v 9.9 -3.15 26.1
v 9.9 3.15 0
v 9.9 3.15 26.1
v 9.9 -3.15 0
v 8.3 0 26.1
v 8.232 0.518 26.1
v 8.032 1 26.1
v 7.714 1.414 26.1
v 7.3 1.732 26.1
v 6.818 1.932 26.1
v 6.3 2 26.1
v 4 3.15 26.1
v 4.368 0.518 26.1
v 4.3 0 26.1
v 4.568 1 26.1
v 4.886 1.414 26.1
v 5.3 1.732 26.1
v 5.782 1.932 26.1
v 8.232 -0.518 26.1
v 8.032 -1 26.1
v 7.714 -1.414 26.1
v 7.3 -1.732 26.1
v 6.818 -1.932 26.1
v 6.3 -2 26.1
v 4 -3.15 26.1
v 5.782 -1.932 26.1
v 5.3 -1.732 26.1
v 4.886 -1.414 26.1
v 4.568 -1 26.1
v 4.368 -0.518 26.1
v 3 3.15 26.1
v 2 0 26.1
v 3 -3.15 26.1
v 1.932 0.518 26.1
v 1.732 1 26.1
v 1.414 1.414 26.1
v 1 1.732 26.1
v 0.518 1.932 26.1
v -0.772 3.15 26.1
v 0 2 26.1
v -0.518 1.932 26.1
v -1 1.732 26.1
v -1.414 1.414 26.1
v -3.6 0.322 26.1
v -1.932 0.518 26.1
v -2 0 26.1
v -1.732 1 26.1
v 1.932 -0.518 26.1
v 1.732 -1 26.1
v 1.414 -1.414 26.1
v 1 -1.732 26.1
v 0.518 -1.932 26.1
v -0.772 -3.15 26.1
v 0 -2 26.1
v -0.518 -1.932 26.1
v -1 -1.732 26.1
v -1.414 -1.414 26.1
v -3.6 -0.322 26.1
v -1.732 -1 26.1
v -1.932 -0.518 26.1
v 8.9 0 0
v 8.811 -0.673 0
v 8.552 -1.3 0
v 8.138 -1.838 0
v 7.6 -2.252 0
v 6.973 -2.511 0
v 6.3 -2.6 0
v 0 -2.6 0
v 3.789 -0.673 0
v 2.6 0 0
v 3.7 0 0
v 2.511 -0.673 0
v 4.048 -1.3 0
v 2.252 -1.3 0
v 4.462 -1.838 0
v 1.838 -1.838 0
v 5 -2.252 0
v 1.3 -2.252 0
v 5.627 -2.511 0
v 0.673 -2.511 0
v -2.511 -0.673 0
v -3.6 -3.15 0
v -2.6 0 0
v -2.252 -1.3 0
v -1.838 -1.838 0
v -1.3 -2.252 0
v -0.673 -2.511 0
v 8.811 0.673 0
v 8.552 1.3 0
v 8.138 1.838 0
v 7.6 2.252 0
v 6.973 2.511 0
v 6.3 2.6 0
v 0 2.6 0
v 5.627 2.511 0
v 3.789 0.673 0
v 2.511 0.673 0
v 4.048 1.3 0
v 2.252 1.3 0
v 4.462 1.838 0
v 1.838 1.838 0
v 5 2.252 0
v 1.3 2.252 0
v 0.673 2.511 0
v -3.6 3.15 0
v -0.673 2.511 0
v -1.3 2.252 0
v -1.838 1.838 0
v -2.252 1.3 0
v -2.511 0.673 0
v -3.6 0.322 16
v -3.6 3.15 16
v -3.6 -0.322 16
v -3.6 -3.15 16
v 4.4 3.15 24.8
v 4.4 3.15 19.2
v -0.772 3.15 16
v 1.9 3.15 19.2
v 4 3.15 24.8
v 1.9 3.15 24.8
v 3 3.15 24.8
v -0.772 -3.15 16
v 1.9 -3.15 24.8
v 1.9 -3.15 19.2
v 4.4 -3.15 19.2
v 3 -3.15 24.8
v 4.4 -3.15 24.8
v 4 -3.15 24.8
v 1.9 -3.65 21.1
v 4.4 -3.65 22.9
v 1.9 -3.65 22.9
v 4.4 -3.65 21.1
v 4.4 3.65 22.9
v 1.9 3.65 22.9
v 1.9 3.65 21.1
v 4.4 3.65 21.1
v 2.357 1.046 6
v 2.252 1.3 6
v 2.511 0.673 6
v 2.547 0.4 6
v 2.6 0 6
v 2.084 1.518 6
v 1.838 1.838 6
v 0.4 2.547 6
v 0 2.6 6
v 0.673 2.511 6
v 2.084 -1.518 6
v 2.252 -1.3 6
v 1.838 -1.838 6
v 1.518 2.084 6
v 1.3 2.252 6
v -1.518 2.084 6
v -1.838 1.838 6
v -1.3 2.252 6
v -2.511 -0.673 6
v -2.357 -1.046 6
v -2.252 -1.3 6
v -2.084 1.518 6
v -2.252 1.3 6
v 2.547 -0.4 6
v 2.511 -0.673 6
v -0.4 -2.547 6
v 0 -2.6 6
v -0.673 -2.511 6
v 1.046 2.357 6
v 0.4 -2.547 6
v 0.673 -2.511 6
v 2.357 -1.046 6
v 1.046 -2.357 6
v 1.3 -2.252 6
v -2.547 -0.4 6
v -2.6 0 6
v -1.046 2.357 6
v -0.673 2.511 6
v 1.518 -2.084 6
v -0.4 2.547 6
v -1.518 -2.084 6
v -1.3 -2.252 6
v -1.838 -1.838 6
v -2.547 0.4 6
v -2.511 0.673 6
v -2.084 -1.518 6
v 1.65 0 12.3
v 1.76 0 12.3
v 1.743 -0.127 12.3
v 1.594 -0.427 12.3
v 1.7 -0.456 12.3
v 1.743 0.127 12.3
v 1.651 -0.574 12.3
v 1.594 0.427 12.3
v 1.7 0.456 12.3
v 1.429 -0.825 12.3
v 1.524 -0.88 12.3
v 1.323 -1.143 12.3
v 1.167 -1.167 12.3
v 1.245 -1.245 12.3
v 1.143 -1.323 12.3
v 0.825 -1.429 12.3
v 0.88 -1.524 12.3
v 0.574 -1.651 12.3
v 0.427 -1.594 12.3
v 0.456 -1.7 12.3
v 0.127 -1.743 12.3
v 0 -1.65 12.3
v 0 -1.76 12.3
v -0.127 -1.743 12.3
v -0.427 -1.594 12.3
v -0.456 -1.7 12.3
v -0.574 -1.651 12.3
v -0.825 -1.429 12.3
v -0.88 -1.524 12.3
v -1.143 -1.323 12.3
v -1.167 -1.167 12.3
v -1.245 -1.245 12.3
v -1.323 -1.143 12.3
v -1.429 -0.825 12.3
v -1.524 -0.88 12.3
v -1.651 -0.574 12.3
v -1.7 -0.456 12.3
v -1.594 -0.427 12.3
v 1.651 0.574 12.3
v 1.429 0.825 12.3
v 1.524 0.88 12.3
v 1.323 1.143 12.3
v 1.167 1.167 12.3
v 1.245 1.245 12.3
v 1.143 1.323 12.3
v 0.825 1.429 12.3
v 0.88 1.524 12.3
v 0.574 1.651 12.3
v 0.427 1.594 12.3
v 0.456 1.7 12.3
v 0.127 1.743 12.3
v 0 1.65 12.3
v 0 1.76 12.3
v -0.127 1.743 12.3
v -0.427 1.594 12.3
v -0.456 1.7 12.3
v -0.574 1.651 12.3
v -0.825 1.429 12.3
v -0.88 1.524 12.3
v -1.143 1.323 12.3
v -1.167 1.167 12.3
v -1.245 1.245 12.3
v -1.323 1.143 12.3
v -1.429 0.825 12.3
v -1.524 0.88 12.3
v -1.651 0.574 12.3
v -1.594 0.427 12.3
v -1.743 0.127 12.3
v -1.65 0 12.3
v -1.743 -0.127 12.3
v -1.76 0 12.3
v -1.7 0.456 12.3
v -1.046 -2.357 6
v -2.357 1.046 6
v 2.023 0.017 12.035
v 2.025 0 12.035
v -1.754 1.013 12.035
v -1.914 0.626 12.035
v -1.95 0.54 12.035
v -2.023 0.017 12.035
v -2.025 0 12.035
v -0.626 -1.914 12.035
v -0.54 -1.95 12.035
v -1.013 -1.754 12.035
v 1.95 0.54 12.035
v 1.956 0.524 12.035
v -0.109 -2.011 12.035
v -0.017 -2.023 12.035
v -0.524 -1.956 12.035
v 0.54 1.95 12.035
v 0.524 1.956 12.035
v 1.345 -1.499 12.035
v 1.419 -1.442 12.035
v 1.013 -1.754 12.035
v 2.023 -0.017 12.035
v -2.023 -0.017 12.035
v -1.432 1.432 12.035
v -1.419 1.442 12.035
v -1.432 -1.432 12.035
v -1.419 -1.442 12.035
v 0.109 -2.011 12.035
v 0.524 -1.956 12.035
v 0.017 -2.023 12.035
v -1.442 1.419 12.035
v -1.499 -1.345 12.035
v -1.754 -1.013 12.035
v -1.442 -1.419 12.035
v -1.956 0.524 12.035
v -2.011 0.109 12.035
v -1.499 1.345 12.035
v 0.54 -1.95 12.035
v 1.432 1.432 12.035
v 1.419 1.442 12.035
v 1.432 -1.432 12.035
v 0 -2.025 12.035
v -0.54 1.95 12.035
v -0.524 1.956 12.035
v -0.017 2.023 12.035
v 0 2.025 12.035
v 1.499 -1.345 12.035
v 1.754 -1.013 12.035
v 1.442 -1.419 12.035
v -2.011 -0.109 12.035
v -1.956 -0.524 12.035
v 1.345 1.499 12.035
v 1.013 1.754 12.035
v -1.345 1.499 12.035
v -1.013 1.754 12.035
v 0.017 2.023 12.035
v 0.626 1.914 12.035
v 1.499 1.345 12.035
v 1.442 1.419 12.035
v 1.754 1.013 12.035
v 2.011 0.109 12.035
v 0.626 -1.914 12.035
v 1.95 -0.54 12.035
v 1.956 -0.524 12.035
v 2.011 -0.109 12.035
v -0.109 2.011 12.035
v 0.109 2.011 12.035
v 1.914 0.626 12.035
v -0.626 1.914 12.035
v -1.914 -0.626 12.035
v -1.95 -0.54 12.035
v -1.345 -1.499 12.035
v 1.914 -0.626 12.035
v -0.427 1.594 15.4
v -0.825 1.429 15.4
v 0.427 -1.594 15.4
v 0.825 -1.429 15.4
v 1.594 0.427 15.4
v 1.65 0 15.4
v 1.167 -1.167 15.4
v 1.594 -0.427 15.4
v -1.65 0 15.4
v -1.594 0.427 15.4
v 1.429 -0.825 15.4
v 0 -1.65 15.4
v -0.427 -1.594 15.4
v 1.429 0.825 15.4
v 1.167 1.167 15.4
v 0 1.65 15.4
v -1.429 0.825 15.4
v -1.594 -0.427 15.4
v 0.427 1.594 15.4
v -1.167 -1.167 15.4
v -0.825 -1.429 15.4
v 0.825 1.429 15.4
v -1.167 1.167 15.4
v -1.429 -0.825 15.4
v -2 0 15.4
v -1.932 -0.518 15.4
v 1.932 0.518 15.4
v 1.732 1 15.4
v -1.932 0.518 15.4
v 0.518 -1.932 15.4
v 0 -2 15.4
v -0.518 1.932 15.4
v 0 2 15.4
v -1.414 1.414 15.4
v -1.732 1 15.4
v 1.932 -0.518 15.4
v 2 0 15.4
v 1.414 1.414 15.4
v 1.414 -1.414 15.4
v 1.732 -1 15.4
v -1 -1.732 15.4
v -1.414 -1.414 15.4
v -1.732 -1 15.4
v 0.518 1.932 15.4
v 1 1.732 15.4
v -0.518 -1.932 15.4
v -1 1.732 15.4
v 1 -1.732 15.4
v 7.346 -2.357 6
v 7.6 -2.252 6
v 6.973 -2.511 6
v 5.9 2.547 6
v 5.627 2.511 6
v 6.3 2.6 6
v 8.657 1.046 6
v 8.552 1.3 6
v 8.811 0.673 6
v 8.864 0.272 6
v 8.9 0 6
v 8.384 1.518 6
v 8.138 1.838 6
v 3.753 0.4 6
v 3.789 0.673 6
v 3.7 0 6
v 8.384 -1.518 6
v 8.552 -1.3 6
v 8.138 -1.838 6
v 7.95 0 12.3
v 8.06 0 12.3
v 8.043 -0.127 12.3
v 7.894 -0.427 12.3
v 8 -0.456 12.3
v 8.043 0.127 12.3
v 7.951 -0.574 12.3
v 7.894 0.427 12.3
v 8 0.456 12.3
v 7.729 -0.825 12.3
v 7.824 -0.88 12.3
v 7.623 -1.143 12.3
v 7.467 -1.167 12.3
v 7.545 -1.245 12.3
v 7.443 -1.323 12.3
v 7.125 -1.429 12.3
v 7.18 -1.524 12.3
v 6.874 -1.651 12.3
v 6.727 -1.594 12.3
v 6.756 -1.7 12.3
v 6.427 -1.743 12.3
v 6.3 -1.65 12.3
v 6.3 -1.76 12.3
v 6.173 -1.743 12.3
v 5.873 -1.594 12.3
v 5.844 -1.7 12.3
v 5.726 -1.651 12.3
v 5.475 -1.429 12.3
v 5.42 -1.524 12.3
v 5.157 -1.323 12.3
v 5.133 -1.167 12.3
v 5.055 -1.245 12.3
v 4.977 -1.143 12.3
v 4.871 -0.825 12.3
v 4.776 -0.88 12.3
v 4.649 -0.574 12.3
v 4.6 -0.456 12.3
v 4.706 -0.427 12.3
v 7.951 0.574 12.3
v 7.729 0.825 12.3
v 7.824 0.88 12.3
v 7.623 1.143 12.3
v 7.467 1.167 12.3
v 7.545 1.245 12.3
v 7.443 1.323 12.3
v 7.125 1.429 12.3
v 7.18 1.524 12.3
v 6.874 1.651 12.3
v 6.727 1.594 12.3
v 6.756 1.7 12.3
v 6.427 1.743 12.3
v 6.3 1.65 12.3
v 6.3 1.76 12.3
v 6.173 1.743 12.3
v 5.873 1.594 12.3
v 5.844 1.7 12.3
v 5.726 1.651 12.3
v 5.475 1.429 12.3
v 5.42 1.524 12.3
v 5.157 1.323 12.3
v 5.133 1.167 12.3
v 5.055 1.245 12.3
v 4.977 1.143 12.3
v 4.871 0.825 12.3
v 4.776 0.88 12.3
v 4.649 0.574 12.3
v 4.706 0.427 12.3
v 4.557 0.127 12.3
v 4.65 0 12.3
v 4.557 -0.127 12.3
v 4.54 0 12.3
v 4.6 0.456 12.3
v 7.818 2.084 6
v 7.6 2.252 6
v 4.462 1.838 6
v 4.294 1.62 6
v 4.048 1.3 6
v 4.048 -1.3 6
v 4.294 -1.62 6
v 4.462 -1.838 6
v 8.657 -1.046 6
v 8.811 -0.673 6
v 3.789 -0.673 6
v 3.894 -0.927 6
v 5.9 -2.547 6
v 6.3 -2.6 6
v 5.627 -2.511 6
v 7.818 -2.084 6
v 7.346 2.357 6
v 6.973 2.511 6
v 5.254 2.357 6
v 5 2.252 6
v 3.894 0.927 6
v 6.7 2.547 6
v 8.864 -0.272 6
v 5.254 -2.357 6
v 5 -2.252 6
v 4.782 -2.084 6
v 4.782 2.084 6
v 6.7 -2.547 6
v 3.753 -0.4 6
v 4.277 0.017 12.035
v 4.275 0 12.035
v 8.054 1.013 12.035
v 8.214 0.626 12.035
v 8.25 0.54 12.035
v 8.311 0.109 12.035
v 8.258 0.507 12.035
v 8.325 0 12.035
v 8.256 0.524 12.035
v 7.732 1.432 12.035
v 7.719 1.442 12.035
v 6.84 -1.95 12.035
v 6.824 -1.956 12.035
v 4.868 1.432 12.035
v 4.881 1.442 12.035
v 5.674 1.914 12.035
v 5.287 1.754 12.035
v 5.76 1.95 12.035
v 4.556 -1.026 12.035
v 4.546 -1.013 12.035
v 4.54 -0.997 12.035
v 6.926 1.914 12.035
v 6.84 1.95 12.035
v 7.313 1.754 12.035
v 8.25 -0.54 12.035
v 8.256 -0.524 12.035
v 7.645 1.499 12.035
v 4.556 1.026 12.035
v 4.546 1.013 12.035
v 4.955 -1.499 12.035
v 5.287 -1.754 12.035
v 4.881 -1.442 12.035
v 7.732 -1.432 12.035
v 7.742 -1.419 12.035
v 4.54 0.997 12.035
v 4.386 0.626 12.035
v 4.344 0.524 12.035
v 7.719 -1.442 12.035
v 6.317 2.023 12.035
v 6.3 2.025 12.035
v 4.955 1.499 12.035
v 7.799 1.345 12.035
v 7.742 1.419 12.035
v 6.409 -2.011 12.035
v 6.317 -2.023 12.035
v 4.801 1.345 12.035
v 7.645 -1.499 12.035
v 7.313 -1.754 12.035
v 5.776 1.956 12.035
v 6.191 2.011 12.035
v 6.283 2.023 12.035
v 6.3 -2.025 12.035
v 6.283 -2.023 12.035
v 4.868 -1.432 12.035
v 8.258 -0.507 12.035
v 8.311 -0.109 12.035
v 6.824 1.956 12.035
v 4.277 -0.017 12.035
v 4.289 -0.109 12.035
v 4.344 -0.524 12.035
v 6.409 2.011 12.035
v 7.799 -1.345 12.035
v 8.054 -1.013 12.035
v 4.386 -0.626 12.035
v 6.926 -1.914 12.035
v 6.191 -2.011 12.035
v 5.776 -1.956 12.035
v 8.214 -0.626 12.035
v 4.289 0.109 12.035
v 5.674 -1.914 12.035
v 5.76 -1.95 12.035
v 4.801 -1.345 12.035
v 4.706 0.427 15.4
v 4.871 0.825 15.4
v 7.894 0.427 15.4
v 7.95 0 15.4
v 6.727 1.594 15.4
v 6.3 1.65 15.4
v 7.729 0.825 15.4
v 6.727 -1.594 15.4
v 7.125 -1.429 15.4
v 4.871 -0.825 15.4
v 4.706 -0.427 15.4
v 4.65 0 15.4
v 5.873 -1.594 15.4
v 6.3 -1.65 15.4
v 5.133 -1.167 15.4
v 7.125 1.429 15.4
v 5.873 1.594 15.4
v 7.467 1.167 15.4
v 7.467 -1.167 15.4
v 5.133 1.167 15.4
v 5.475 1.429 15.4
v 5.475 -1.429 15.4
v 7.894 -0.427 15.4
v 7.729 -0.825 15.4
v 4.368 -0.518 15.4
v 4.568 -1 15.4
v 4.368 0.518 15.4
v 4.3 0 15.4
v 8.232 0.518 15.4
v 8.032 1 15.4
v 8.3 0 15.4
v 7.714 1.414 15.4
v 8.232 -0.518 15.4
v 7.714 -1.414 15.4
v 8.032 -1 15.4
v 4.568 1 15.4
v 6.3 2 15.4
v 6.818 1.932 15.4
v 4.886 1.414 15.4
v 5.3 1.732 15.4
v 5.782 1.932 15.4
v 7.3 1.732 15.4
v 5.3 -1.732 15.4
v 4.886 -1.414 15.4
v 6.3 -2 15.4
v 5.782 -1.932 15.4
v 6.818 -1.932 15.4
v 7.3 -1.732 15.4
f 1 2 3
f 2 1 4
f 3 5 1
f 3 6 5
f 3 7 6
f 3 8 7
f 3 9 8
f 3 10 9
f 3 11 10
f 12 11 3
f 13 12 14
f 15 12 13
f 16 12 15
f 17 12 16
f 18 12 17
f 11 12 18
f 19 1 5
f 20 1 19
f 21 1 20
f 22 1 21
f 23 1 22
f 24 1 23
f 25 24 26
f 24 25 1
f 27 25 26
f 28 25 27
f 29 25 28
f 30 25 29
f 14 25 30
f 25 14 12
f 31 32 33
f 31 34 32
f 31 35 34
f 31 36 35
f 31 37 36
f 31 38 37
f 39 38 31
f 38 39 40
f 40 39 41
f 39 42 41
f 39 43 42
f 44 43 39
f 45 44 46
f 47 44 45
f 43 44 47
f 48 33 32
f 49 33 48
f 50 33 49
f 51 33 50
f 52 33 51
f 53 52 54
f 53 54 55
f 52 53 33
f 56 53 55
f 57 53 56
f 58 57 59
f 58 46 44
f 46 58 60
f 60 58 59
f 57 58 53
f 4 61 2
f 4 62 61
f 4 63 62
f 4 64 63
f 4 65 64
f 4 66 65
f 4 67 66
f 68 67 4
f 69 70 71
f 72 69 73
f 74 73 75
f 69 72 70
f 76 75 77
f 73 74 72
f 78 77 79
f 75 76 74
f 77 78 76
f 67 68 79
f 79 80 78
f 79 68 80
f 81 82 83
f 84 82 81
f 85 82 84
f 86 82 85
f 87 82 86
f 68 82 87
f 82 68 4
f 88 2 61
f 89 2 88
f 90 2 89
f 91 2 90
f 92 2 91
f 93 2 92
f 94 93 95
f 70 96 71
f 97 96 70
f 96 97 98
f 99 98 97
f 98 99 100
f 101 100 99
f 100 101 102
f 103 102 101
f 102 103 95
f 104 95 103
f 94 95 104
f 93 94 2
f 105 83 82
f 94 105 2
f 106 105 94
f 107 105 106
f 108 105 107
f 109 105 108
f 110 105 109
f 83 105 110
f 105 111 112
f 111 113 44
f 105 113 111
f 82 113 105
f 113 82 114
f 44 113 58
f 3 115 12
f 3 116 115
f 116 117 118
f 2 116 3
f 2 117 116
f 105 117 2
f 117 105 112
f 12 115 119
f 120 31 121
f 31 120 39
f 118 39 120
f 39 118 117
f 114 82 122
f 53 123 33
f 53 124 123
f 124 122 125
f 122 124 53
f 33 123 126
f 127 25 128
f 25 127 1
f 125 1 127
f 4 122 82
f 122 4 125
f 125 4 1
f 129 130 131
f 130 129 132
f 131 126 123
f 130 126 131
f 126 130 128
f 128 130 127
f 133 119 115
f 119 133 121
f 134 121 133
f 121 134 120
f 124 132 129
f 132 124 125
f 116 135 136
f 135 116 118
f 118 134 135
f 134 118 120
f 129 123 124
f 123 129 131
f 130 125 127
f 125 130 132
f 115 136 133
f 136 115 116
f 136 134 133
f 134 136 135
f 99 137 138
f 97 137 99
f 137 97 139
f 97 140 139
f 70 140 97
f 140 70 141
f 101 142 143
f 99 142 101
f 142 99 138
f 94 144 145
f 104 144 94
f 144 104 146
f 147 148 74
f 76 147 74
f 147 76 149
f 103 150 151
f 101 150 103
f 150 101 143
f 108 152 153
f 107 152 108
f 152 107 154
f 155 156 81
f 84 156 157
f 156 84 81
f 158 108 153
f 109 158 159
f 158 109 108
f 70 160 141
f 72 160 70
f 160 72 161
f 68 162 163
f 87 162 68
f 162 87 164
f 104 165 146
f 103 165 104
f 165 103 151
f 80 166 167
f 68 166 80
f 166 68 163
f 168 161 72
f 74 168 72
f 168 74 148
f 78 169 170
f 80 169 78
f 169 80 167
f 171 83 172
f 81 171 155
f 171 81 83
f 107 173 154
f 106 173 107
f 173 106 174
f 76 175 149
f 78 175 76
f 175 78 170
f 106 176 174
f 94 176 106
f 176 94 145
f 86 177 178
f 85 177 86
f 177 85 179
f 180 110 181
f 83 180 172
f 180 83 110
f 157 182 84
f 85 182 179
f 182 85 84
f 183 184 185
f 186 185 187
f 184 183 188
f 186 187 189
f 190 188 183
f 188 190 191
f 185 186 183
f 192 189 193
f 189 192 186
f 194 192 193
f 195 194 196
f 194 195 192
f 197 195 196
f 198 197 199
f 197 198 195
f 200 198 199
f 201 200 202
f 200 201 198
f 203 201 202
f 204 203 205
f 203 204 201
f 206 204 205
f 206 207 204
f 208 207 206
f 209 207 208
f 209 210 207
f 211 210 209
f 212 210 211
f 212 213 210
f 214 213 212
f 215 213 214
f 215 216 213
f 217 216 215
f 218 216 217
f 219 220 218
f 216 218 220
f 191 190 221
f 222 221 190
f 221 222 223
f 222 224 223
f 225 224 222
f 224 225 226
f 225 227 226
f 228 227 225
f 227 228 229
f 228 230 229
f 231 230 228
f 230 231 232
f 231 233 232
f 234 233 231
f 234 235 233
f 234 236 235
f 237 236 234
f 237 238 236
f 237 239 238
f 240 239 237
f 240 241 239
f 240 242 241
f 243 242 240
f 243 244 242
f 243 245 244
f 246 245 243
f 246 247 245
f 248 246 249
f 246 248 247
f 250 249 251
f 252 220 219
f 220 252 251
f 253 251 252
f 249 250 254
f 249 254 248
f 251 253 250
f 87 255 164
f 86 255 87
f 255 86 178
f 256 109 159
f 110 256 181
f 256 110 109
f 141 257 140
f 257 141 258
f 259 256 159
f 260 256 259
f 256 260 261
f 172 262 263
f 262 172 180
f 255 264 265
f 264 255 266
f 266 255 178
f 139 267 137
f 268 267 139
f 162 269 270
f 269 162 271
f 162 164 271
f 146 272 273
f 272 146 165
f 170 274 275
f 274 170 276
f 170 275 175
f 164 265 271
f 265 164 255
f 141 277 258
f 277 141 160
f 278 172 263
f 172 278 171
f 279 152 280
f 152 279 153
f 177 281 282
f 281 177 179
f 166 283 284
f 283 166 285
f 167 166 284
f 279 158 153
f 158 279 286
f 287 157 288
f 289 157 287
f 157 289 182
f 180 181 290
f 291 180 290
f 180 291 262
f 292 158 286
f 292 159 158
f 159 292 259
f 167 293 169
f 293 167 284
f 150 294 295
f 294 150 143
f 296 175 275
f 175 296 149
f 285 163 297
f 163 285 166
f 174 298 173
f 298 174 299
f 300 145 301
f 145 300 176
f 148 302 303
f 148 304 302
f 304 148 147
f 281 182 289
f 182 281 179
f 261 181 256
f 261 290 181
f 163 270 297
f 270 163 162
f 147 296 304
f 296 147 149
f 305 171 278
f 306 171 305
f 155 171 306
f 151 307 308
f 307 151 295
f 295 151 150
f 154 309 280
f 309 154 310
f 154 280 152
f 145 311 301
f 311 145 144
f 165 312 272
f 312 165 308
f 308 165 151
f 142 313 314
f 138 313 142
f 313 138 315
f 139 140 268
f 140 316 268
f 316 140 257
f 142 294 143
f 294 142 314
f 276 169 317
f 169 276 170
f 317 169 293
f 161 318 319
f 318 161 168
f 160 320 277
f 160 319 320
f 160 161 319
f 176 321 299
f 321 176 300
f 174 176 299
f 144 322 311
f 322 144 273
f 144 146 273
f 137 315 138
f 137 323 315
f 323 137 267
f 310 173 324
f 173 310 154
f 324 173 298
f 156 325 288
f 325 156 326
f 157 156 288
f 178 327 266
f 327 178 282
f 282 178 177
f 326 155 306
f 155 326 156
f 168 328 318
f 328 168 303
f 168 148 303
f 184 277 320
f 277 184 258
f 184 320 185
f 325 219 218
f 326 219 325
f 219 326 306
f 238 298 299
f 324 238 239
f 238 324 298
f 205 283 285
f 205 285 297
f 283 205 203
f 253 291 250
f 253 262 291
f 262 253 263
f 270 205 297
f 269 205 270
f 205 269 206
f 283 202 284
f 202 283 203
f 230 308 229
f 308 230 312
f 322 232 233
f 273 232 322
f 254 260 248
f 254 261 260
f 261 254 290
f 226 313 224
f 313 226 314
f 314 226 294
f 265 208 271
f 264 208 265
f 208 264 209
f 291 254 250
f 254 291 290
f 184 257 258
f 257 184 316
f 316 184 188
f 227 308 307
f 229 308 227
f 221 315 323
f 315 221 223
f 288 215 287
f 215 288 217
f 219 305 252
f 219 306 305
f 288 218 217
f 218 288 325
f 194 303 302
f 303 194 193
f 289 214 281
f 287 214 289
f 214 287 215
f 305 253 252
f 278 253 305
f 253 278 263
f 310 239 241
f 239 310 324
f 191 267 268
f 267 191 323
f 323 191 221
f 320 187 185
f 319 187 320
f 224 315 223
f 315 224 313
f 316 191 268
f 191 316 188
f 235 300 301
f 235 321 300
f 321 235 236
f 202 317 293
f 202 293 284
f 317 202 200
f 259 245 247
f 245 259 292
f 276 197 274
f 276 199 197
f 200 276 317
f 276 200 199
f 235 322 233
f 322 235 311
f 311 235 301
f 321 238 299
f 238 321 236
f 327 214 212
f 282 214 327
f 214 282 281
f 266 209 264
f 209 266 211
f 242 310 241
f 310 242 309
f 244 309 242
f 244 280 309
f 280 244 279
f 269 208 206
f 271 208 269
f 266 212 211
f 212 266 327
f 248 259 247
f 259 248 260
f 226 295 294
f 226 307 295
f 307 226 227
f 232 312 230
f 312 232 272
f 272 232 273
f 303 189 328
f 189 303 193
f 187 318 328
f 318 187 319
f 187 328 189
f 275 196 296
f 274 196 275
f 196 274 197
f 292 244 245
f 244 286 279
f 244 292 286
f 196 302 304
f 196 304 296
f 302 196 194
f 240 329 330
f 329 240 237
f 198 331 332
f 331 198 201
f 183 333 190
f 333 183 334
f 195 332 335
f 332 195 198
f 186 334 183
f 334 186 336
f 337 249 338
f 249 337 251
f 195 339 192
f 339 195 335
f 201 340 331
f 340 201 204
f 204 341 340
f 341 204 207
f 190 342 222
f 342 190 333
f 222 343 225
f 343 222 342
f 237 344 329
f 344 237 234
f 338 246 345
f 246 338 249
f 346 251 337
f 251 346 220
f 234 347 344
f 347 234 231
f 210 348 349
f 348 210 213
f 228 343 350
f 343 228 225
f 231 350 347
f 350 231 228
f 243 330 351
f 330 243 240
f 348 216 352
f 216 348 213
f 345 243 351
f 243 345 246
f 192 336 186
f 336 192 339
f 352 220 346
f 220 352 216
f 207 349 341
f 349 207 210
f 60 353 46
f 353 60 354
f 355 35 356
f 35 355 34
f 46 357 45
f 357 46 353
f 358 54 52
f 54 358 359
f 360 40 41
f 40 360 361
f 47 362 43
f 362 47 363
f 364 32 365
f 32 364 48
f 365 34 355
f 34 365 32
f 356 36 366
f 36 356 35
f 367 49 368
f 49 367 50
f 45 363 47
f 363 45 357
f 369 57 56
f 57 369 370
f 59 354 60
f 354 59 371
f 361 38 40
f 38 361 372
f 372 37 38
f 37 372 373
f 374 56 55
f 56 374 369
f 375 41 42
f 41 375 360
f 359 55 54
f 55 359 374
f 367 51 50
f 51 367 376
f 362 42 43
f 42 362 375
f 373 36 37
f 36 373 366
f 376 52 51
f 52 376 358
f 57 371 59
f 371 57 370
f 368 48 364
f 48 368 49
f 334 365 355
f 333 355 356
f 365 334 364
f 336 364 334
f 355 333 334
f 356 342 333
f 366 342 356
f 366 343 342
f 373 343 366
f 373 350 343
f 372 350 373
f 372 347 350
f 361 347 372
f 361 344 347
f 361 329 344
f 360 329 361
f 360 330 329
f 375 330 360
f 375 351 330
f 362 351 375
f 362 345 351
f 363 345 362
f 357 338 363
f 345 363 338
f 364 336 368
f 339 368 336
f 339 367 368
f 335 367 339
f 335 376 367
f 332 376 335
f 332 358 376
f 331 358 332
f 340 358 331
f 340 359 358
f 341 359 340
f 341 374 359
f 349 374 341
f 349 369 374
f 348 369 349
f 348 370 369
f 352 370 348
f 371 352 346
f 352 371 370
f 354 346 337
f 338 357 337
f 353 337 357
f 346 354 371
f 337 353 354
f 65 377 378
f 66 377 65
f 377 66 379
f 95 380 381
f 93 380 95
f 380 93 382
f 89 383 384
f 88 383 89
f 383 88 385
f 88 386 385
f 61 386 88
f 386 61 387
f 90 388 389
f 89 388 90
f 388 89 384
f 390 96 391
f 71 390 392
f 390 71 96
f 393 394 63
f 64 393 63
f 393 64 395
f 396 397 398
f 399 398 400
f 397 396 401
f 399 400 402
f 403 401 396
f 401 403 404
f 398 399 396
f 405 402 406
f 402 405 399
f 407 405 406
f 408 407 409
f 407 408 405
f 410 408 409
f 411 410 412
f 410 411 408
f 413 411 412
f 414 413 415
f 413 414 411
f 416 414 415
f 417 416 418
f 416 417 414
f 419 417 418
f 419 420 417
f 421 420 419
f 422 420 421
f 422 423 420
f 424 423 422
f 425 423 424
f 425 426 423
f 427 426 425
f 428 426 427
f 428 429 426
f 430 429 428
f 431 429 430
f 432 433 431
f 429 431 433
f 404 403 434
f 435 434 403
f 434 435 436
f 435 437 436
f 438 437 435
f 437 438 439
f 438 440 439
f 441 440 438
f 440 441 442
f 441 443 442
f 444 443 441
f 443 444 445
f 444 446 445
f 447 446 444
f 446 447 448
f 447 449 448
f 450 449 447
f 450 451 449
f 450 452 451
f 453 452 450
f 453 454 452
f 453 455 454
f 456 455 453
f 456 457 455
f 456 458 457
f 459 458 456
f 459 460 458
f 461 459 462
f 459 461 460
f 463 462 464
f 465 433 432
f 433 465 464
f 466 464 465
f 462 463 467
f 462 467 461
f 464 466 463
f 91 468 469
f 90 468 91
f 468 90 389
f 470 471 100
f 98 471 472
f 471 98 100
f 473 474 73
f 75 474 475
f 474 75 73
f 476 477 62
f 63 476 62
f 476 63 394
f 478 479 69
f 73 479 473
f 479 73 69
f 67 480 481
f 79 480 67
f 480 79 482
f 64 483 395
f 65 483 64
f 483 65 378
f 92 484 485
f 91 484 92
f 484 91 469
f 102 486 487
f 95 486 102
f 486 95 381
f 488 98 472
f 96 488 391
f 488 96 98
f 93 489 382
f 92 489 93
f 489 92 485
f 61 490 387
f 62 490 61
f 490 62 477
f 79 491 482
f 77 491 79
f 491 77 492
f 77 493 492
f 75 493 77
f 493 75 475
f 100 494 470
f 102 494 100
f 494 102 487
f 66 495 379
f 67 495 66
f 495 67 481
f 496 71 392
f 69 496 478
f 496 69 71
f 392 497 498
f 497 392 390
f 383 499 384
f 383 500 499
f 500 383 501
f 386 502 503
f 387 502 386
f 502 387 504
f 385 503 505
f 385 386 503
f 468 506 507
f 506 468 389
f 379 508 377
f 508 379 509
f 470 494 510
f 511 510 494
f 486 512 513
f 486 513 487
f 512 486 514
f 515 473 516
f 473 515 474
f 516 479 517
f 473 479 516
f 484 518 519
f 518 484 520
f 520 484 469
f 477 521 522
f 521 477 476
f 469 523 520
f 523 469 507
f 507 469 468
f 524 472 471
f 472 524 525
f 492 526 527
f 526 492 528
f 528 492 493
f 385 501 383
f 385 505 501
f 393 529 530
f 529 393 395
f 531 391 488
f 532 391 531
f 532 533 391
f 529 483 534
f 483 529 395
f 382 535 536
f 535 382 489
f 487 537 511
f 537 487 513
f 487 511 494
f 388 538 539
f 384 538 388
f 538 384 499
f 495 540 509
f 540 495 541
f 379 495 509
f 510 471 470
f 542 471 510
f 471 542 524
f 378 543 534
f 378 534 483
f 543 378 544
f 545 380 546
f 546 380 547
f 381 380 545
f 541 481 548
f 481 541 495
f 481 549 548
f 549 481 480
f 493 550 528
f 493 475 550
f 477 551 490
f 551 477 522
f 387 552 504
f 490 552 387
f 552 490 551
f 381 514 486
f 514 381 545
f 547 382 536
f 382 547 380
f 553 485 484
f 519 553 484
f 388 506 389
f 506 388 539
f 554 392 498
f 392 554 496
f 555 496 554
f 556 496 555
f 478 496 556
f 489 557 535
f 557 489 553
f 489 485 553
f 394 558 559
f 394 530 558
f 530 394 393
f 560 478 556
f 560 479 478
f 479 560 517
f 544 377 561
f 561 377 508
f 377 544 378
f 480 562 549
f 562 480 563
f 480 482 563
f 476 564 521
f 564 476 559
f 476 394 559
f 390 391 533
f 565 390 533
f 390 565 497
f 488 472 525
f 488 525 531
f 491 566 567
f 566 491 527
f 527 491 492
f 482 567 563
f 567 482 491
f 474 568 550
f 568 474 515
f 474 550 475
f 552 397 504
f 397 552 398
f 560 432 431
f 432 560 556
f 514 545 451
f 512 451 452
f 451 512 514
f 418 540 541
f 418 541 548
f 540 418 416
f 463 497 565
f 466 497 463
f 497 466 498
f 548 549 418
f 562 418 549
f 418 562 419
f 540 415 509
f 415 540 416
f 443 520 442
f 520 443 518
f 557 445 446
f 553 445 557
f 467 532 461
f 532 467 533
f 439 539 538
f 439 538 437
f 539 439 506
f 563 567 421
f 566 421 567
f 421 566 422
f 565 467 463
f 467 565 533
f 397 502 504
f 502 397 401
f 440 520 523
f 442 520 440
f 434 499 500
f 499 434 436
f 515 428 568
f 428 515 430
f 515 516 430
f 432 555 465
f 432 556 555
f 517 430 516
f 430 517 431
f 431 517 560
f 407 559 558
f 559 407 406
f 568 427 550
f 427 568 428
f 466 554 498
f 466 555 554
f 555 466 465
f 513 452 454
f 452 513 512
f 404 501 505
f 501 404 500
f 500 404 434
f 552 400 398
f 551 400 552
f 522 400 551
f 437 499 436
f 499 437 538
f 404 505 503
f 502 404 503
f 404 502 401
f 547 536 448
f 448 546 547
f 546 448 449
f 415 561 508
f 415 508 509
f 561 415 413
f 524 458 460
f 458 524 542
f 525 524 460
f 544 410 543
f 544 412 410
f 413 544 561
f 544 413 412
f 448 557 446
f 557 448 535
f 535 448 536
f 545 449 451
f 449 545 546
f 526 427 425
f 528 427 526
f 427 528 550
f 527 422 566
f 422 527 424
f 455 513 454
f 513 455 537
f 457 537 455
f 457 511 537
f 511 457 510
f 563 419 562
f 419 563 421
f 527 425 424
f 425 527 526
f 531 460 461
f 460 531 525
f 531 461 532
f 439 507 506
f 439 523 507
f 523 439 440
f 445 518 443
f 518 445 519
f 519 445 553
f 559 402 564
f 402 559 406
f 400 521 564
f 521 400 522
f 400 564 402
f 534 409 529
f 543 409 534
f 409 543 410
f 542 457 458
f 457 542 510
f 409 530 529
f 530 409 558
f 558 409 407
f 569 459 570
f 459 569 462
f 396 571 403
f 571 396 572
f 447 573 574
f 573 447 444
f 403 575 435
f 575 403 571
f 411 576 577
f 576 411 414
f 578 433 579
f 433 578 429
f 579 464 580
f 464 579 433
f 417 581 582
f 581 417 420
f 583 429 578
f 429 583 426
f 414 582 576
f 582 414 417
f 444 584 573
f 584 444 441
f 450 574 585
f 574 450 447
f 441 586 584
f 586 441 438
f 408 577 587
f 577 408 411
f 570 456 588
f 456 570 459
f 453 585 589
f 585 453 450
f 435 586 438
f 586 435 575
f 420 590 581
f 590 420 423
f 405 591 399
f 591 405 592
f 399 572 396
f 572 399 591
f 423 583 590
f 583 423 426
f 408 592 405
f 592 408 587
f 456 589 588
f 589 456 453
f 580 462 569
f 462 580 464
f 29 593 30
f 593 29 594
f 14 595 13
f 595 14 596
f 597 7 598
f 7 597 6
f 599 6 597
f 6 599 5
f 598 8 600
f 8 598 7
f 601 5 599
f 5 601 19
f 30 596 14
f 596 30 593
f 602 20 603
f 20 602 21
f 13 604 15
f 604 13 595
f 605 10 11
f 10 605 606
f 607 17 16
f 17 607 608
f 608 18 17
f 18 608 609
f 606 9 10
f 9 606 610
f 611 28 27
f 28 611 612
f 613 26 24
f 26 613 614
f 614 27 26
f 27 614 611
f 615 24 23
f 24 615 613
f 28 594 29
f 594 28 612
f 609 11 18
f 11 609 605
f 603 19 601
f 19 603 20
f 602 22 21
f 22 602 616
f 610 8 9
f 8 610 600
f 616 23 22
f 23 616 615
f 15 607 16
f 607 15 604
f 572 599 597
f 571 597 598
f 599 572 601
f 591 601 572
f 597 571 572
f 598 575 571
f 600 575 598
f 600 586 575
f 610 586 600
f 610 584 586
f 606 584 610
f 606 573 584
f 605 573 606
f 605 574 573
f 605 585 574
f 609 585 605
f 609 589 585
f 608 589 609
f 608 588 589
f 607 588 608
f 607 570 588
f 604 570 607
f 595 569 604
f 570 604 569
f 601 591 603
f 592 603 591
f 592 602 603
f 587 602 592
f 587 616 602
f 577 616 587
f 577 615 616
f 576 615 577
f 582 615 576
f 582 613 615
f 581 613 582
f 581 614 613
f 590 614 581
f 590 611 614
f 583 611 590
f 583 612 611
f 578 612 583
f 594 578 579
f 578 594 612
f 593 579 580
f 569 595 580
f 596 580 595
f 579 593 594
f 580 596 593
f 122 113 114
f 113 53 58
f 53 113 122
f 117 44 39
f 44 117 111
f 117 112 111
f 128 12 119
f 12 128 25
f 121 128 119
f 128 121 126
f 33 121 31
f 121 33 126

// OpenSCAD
// connectors that can use contacts for Molex 093 connectors
// two contact versions

$fn=24;
delta=1;  // for making surfaces non-coincident

translate([0,0,0]) receptacle();

//translate([0,20,0]) plug();

// pin 1 at the origin

recepBodyHeight = 26.1; // height of overall body
recepBodyXwidth = 13.5;
recepBodyYwidth = 6.3; 
recepPin1toEdge = 3.6;
earZcenterline = 22;
earFlatZwidth = 1.8;
earTotalZwidth = 5.6;
earXwidth = 2.5;
earYwidth = 7.3;
contactHoleBackDiam = 5.2;
contactHoleBackTaperDiam = 4;
contactHoleBackTaperStartZ = 6;
contactHoleBackTopZ = 12.3;
contactHoleMidDiam = 3.3;
contactHoleFrontDiam = 4;
contactHoleFrontDepth = 10.7;
contactCenterToCenter = 6.3;

/*  cross sections for checking clearances*/ 
/*
projection(cut = true)   
rotate([90,0,0]) 
union() { receptacle();  translate([0,0,42]) rotate([180,0,0]) plug();
    
    translate([30,-3,0]) rotate([0,0,90]) 
    union(){ receptacle();  translate([0,0,42]) rotate([180,0,0]) plug(); }
        
            translate([60,0,0]) rotate([0,0,90]) 
    union(){ receptacle();  translate([0,0,42]) rotate([180,0,0]) plug();}
        
    } */



plugBodyHeight = 25.4; // height of overall body
plugBodyXwidth = 16.3;
plugBodyYwidth = 9;
plugShroudWallWidth = 1.2;
plugFaceZ = 15.7;
plugBackXwidth = 6.6;
recepClearance = 0.3;
plugXcenterline = plugBodyXwidth/2;

plugPin1toEdge = 5.5;

plugLatchSlotHeight = 21.8;
plugLatchSlotWidth = 3.4 ;

module plug()
{
    difference()
    {
        translate([-plugPin1toEdge+plugBodyXwidth/2,0,plugBodyHeight/2]) cube([plugBodyXwidth ,plugBodyYwidth,plugBodyHeight],center=true);
        
        union()  // cutter 
        {
            difference()   // for cavity in shroud
            {
                translate([recepBodyXwidth/2-recepPin1toEdge,0,plugFaceZ+ (plugBodyHeight-plugFaceZ)/2+ delta/2])
                    cube([recepBodyXwidth+recepClearance*2,recepBodyYwidth+recepClearance*2,(plugBodyHeight-plugFaceZ)+delta],center=true);
                // cut out the two 45 degree keying features
                translate([-recepPin1toEdge-recepClearance,-recepBodyYwidth/2-recepClearance,15+20/2]) rotate([0,0,45]) cube([4,8,20],center=true);
                translate([-recepPin1toEdge-recepClearance,recepBodyYwidth/2+recepClearance,15+20/2]) rotate([0,0,-45]) cube([4,8,20],center=true);
    
                // tiny wall between contacts
                translate([contactCenterToCenter/2+0.35,0,plugFaceZ+1/2-delta/2])        cube([0.8,recepBodyYwidth+1,1+delta],center=true); // height  1  width 0.8           
                
            }
            // slots to accomodate the latches on the recep
            translate([contactCenterToCenter/2,plugBodyYwidth/2+4/2-1.3,(plugLatchSlotHeight)/2-delta/2])
                cube([plugLatchSlotWidth,4,plugLatchSlotHeight+delta],center=true);
            translate([contactCenterToCenter/2,-plugBodyYwidth/2-4/2+1.3,(plugLatchSlotHeight)/2-delta/2])
                cube([plugLatchSlotWidth,4,plugLatchSlotHeight+delta],center=true);

        } // union  cutter
        
        // holes for contacts
        for (i=[[0,0],[0+contactCenterToCenter,0]])
            union()
            {
                difference()
                {
                    intersection()  //  back part of contact hole is tapered from 5.2 at z=6 to 4 at z=12.3
                    {   // make taper by intersection cylinder with cone
                        translate([i[0],i[1],(plugFaceZ-3.4-contactHoleBackTopZ)-delta]) cylinder(d=contactHoleBackDiam,h=contactHoleBackTopZ+delta);
                        translate([i[0],i[1],(plugFaceZ-3.4-contactHoleBackTopZ)-delta]) cylinder(d2=contactHoleBackTaperDiam,d1=contactHoleBackTaperDiam+(contactHoleBackDiam-contactHoleBackTaperDiam)*(contactHoleBackTopZ+delta)/(contactHoleBackTopZ-contactHoleBackTaperStartZ),h=contactHoleBackTopZ+delta);
                    } // intersection
                    translate([i[0],i[1],plugFaceZ-3.4]) rotate([180,0,0])
                        outerCircularBevelCutter(contactHoleBackDiam,(contactHoleBackDiam-contactHoleBackTaperDiam)*0.7);  // bevel to help overhang
                }  // difference
                // center part of contact hole, performs locking function  axial length 3.4
                
                translate([i[0],i[1],plugFaceZ-3.4/2]) cylinder(d=contactHoleMidDiam,h=3.4+2*delta,center=true);        
            } // union  (also end of for loop)        
        
        // trim sides
        difference()
            {
         translate([-plugPin1toEdge+plugBodyXwidth/2,0,14.8/2-delta/2]) cube([plugBodyXwidth+2*delta ,plugBodyYwidth+2*delta,14.8+delta],center=true);               
            translate([-recepPin1toEdge,-recepBodyYwidth/2,-delta]) cube([recepBodyXwidth,recepBodyYwidth,14.8+4*delta],center=false);     
            translate([-recepPin1toEdge+recepBodyXwidth/2,0,14.8]) rotate([180,0,0])
                innerRectangleBevelCutter(recepBodyXwidth,recepBodyYwidth,1.4);
    
                difference()
                {
                    union()
                    {
                    // side ribs
                translate([0,0,20/2+6.8]) cube([1.5,20,20],center=true);    
                translate([contactCenterToCenter,0,20/2+6.8]) cube([1.5,20,20],center=true);   
                    } // union
                
                    // trim bottoms of ribs at 45 for printability
                    translate([-recepPin1toEdge+recepBodyXwidth/2,0,6.8-1]) rotate([0,0,0])
                    outerRectangleBevelCutter(recepBodyXwidth,recepBodyYwidth,1.4);
                }  // difference
                
        
            }
        // cut out the two 45 degree keying features
                           translate([-recepPin1toEdge-recepClearance-0.7,-recepBodyYwidth/2-recepClearance-0.7,14.7-1.4+20/2]) rotate([0,0,45]) cube([4,8,20],center=true);
                    translate([-recepPin1toEdge-recepClearance-0.7,recepBodyYwidth/2+recepClearance+0.7,14.7-1.4+20/2]) rotate([0,0,-45]) cube([4,8,20],center=true);    

       // trim point of 45 deg part
             translate([-recepPin1toEdge-3.3,0,14.7+20/2])  cube([4,8,20],center=true);           
            
    }  // difference
    
};



module receptacle()
{
    difference()
    {
        union()
        {
            translate([-recepPin1toEdge,-recepBodyYwidth/2,0]) cube([recepBodyXwidth,recepBodyYwidth,recepBodyHeight],center=false);  // main body
            hull()   // locking ears
            {
                translate([contactCenterToCenter/2,0,earZcenterline]) cube([earXwidth,earYwidth,earFlatZwidth],center=true);
                translate([contactCenterToCenter/2,0,earZcenterline]) cube([earXwidth,earYwidth-(earYwidth-recepBodyYwidth)*1.5,earFlatZwidth+(earTotalZwidth-earFlatZwidth)*1.5],center=true);                    
            }
        } // union 
        // cut out the two 45 degree keying features
        translate([-recepPin1toEdge,-recepBodyYwidth/2,16+20/2]) rotate([0,0,45]) cube([4,8,20],center=true);
        translate([-recepPin1toEdge,recepBodyYwidth/2,16+20/2]) rotate([0,0,-45]) cube([4,8,20],center=true);
        
        // notch between contacts
        translate([contactCenterToCenter/2+0.35,0,recepBodyHeight+4/2-1.3])        cube([1,recepBodyYwidth+1,4],center=true);
        for (i=[[0,0],[0+contactCenterToCenter,0]])
            union()
            {
                difference()
                {
                    intersection()  //  back part of contact hole is tapered from 5.2 at z=6 to 4 at z=12.3
                    {   // make taper by intersection cylinder with cone
                        translate([i[0],i[1],-delta]) cylinder(d=contactHoleBackDiam,h=contactHoleBackTopZ+delta);
                        translate([i[0],i[1],-delta]) cylinder(d2=contactHoleBackTaperDiam,d1=contactHoleBackTaperDiam+(contactHoleBackDiam-contactHoleBackTaperDiam)*(contactHoleBackTopZ+delta)/(contactHoleBackTopZ-contactHoleBackTaperStartZ),h=contactHoleBackTopZ+delta);
                    } // intersection
                    translate([i[0],i[1],contactHoleBackTopZ]) rotate([180,0,0])
                        outerCircularBevelCutter(contactHoleBackDiam,(contactHoleBackDiam-contactHoleBackTaperDiam)*0.7);  // bevel to help overhang
                }  // difference
                // center part of contact hole, performs locking function
                translate([i[0],i[1],contactHoleBackTopZ-delta]) cylinder(d=contactHoleMidDiam,h=recepBodyHeight-contactHoleBackTopZ-contactHoleFrontDepth+2*delta);
                translate([i[0],i[1],recepBodyHeight-contactHoleFrontDepth]) cylinder(d=contactHoleFrontDiam,h=contactHoleFrontDepth+delta);        
            } // union  (also end of for loop)
    }
}



module outerCircularBevelCutter(d,b)  // improved
{
  difference()  {
   translate([0,0,-delta/2]) cylinder(d=d+delta*2,h=b+1*delta);
   translate([0,0,-1*delta]) cylinder(d1=d-2*b-2*delta,d2=d+2*delta, h=b+2*delta);
  }
};

module outerRectangleBevelCutter(l,w,b)
{ // 
  polyhedron(
    points=[ [l/2+b,w/2+b,2*b],[l/2-2*b,w/2-2*b,-b],[l/2+b,w/2+b,-b],
             [-l/2-b,w/2+b,2*b],[-l/2+2*b,w/2-2*b,-b],[-l/2-b,w/2+b,-b],
             [-l/2-b,-w/2-b,2*b],[-l/2+2*b,-w/2+2*b,-b],[-l/2-b,-w/2-b,-b],
            [l/2+b,-w/2-b,2*b],[l/2-2*b,-w/2+2*b,-b],[l/2+b,-w/2-b,-b] ],
    faces = [  [0,3,2],  [3,5,2],  [2,5,4],   [2,4,1],  [1,4, 0], [0,4,3] 
              ,[3,6,5],  [6,8,5],  [5,8,7],   [5,7,4],  [4,7, 3], [3,7,6] 
              ,[6,9,8],  [9,11,8], [8,11,10], [8,10,7], [7,10,6], [6,10,9] 
              ,[9,0,11], [0,2,11], [11,2,1],  [11,1,10], [10,1,9], [9,1,0] ] ); 
};


module innerRectangleBevelCutter(l,w,b)
{ // 
  polyhedron(
    points=[ [l/2-b,w/2-b,2*b],[l/2-b,w/2-b,-b],[l/2+2*b,w/2+2*b,-b],
             [-l/2+b,w/2-b,2*b],[-l/2+b,w/2-b,-b],[-l/2-2*b,w/2+2*b,-b],
             [-l/2+b,-w/2+b,2*b],[-l/2+b,-w/2+b,-b],[-l/2-2*b,-w/2-2*b,-b],
            [l/2-b,-w/2+b,2*b],[l/2-b,-w/2+b,-b],[l/2+2*b,-w/2-2*b,-b] ],
    faces = [  [0,3,2],  [3,5,2],  [2,5,4],   [2,4,1],  [1,4, 0], [0,4,3] 
              ,[3,6,5],  [6,8,5],  [5,8,7],   [5,7,4],  [4,7, 3], [3,7,6] 
              ,[6,9,8],  [9,11,8], [8,11,10], [8,10,7], [7,10,6], [6,10,9] 
              ,[9,0,11], [0,2,11], [11,2,1],  [11,1,10], [10,1,9], [9,1,0] ] ); 
};
